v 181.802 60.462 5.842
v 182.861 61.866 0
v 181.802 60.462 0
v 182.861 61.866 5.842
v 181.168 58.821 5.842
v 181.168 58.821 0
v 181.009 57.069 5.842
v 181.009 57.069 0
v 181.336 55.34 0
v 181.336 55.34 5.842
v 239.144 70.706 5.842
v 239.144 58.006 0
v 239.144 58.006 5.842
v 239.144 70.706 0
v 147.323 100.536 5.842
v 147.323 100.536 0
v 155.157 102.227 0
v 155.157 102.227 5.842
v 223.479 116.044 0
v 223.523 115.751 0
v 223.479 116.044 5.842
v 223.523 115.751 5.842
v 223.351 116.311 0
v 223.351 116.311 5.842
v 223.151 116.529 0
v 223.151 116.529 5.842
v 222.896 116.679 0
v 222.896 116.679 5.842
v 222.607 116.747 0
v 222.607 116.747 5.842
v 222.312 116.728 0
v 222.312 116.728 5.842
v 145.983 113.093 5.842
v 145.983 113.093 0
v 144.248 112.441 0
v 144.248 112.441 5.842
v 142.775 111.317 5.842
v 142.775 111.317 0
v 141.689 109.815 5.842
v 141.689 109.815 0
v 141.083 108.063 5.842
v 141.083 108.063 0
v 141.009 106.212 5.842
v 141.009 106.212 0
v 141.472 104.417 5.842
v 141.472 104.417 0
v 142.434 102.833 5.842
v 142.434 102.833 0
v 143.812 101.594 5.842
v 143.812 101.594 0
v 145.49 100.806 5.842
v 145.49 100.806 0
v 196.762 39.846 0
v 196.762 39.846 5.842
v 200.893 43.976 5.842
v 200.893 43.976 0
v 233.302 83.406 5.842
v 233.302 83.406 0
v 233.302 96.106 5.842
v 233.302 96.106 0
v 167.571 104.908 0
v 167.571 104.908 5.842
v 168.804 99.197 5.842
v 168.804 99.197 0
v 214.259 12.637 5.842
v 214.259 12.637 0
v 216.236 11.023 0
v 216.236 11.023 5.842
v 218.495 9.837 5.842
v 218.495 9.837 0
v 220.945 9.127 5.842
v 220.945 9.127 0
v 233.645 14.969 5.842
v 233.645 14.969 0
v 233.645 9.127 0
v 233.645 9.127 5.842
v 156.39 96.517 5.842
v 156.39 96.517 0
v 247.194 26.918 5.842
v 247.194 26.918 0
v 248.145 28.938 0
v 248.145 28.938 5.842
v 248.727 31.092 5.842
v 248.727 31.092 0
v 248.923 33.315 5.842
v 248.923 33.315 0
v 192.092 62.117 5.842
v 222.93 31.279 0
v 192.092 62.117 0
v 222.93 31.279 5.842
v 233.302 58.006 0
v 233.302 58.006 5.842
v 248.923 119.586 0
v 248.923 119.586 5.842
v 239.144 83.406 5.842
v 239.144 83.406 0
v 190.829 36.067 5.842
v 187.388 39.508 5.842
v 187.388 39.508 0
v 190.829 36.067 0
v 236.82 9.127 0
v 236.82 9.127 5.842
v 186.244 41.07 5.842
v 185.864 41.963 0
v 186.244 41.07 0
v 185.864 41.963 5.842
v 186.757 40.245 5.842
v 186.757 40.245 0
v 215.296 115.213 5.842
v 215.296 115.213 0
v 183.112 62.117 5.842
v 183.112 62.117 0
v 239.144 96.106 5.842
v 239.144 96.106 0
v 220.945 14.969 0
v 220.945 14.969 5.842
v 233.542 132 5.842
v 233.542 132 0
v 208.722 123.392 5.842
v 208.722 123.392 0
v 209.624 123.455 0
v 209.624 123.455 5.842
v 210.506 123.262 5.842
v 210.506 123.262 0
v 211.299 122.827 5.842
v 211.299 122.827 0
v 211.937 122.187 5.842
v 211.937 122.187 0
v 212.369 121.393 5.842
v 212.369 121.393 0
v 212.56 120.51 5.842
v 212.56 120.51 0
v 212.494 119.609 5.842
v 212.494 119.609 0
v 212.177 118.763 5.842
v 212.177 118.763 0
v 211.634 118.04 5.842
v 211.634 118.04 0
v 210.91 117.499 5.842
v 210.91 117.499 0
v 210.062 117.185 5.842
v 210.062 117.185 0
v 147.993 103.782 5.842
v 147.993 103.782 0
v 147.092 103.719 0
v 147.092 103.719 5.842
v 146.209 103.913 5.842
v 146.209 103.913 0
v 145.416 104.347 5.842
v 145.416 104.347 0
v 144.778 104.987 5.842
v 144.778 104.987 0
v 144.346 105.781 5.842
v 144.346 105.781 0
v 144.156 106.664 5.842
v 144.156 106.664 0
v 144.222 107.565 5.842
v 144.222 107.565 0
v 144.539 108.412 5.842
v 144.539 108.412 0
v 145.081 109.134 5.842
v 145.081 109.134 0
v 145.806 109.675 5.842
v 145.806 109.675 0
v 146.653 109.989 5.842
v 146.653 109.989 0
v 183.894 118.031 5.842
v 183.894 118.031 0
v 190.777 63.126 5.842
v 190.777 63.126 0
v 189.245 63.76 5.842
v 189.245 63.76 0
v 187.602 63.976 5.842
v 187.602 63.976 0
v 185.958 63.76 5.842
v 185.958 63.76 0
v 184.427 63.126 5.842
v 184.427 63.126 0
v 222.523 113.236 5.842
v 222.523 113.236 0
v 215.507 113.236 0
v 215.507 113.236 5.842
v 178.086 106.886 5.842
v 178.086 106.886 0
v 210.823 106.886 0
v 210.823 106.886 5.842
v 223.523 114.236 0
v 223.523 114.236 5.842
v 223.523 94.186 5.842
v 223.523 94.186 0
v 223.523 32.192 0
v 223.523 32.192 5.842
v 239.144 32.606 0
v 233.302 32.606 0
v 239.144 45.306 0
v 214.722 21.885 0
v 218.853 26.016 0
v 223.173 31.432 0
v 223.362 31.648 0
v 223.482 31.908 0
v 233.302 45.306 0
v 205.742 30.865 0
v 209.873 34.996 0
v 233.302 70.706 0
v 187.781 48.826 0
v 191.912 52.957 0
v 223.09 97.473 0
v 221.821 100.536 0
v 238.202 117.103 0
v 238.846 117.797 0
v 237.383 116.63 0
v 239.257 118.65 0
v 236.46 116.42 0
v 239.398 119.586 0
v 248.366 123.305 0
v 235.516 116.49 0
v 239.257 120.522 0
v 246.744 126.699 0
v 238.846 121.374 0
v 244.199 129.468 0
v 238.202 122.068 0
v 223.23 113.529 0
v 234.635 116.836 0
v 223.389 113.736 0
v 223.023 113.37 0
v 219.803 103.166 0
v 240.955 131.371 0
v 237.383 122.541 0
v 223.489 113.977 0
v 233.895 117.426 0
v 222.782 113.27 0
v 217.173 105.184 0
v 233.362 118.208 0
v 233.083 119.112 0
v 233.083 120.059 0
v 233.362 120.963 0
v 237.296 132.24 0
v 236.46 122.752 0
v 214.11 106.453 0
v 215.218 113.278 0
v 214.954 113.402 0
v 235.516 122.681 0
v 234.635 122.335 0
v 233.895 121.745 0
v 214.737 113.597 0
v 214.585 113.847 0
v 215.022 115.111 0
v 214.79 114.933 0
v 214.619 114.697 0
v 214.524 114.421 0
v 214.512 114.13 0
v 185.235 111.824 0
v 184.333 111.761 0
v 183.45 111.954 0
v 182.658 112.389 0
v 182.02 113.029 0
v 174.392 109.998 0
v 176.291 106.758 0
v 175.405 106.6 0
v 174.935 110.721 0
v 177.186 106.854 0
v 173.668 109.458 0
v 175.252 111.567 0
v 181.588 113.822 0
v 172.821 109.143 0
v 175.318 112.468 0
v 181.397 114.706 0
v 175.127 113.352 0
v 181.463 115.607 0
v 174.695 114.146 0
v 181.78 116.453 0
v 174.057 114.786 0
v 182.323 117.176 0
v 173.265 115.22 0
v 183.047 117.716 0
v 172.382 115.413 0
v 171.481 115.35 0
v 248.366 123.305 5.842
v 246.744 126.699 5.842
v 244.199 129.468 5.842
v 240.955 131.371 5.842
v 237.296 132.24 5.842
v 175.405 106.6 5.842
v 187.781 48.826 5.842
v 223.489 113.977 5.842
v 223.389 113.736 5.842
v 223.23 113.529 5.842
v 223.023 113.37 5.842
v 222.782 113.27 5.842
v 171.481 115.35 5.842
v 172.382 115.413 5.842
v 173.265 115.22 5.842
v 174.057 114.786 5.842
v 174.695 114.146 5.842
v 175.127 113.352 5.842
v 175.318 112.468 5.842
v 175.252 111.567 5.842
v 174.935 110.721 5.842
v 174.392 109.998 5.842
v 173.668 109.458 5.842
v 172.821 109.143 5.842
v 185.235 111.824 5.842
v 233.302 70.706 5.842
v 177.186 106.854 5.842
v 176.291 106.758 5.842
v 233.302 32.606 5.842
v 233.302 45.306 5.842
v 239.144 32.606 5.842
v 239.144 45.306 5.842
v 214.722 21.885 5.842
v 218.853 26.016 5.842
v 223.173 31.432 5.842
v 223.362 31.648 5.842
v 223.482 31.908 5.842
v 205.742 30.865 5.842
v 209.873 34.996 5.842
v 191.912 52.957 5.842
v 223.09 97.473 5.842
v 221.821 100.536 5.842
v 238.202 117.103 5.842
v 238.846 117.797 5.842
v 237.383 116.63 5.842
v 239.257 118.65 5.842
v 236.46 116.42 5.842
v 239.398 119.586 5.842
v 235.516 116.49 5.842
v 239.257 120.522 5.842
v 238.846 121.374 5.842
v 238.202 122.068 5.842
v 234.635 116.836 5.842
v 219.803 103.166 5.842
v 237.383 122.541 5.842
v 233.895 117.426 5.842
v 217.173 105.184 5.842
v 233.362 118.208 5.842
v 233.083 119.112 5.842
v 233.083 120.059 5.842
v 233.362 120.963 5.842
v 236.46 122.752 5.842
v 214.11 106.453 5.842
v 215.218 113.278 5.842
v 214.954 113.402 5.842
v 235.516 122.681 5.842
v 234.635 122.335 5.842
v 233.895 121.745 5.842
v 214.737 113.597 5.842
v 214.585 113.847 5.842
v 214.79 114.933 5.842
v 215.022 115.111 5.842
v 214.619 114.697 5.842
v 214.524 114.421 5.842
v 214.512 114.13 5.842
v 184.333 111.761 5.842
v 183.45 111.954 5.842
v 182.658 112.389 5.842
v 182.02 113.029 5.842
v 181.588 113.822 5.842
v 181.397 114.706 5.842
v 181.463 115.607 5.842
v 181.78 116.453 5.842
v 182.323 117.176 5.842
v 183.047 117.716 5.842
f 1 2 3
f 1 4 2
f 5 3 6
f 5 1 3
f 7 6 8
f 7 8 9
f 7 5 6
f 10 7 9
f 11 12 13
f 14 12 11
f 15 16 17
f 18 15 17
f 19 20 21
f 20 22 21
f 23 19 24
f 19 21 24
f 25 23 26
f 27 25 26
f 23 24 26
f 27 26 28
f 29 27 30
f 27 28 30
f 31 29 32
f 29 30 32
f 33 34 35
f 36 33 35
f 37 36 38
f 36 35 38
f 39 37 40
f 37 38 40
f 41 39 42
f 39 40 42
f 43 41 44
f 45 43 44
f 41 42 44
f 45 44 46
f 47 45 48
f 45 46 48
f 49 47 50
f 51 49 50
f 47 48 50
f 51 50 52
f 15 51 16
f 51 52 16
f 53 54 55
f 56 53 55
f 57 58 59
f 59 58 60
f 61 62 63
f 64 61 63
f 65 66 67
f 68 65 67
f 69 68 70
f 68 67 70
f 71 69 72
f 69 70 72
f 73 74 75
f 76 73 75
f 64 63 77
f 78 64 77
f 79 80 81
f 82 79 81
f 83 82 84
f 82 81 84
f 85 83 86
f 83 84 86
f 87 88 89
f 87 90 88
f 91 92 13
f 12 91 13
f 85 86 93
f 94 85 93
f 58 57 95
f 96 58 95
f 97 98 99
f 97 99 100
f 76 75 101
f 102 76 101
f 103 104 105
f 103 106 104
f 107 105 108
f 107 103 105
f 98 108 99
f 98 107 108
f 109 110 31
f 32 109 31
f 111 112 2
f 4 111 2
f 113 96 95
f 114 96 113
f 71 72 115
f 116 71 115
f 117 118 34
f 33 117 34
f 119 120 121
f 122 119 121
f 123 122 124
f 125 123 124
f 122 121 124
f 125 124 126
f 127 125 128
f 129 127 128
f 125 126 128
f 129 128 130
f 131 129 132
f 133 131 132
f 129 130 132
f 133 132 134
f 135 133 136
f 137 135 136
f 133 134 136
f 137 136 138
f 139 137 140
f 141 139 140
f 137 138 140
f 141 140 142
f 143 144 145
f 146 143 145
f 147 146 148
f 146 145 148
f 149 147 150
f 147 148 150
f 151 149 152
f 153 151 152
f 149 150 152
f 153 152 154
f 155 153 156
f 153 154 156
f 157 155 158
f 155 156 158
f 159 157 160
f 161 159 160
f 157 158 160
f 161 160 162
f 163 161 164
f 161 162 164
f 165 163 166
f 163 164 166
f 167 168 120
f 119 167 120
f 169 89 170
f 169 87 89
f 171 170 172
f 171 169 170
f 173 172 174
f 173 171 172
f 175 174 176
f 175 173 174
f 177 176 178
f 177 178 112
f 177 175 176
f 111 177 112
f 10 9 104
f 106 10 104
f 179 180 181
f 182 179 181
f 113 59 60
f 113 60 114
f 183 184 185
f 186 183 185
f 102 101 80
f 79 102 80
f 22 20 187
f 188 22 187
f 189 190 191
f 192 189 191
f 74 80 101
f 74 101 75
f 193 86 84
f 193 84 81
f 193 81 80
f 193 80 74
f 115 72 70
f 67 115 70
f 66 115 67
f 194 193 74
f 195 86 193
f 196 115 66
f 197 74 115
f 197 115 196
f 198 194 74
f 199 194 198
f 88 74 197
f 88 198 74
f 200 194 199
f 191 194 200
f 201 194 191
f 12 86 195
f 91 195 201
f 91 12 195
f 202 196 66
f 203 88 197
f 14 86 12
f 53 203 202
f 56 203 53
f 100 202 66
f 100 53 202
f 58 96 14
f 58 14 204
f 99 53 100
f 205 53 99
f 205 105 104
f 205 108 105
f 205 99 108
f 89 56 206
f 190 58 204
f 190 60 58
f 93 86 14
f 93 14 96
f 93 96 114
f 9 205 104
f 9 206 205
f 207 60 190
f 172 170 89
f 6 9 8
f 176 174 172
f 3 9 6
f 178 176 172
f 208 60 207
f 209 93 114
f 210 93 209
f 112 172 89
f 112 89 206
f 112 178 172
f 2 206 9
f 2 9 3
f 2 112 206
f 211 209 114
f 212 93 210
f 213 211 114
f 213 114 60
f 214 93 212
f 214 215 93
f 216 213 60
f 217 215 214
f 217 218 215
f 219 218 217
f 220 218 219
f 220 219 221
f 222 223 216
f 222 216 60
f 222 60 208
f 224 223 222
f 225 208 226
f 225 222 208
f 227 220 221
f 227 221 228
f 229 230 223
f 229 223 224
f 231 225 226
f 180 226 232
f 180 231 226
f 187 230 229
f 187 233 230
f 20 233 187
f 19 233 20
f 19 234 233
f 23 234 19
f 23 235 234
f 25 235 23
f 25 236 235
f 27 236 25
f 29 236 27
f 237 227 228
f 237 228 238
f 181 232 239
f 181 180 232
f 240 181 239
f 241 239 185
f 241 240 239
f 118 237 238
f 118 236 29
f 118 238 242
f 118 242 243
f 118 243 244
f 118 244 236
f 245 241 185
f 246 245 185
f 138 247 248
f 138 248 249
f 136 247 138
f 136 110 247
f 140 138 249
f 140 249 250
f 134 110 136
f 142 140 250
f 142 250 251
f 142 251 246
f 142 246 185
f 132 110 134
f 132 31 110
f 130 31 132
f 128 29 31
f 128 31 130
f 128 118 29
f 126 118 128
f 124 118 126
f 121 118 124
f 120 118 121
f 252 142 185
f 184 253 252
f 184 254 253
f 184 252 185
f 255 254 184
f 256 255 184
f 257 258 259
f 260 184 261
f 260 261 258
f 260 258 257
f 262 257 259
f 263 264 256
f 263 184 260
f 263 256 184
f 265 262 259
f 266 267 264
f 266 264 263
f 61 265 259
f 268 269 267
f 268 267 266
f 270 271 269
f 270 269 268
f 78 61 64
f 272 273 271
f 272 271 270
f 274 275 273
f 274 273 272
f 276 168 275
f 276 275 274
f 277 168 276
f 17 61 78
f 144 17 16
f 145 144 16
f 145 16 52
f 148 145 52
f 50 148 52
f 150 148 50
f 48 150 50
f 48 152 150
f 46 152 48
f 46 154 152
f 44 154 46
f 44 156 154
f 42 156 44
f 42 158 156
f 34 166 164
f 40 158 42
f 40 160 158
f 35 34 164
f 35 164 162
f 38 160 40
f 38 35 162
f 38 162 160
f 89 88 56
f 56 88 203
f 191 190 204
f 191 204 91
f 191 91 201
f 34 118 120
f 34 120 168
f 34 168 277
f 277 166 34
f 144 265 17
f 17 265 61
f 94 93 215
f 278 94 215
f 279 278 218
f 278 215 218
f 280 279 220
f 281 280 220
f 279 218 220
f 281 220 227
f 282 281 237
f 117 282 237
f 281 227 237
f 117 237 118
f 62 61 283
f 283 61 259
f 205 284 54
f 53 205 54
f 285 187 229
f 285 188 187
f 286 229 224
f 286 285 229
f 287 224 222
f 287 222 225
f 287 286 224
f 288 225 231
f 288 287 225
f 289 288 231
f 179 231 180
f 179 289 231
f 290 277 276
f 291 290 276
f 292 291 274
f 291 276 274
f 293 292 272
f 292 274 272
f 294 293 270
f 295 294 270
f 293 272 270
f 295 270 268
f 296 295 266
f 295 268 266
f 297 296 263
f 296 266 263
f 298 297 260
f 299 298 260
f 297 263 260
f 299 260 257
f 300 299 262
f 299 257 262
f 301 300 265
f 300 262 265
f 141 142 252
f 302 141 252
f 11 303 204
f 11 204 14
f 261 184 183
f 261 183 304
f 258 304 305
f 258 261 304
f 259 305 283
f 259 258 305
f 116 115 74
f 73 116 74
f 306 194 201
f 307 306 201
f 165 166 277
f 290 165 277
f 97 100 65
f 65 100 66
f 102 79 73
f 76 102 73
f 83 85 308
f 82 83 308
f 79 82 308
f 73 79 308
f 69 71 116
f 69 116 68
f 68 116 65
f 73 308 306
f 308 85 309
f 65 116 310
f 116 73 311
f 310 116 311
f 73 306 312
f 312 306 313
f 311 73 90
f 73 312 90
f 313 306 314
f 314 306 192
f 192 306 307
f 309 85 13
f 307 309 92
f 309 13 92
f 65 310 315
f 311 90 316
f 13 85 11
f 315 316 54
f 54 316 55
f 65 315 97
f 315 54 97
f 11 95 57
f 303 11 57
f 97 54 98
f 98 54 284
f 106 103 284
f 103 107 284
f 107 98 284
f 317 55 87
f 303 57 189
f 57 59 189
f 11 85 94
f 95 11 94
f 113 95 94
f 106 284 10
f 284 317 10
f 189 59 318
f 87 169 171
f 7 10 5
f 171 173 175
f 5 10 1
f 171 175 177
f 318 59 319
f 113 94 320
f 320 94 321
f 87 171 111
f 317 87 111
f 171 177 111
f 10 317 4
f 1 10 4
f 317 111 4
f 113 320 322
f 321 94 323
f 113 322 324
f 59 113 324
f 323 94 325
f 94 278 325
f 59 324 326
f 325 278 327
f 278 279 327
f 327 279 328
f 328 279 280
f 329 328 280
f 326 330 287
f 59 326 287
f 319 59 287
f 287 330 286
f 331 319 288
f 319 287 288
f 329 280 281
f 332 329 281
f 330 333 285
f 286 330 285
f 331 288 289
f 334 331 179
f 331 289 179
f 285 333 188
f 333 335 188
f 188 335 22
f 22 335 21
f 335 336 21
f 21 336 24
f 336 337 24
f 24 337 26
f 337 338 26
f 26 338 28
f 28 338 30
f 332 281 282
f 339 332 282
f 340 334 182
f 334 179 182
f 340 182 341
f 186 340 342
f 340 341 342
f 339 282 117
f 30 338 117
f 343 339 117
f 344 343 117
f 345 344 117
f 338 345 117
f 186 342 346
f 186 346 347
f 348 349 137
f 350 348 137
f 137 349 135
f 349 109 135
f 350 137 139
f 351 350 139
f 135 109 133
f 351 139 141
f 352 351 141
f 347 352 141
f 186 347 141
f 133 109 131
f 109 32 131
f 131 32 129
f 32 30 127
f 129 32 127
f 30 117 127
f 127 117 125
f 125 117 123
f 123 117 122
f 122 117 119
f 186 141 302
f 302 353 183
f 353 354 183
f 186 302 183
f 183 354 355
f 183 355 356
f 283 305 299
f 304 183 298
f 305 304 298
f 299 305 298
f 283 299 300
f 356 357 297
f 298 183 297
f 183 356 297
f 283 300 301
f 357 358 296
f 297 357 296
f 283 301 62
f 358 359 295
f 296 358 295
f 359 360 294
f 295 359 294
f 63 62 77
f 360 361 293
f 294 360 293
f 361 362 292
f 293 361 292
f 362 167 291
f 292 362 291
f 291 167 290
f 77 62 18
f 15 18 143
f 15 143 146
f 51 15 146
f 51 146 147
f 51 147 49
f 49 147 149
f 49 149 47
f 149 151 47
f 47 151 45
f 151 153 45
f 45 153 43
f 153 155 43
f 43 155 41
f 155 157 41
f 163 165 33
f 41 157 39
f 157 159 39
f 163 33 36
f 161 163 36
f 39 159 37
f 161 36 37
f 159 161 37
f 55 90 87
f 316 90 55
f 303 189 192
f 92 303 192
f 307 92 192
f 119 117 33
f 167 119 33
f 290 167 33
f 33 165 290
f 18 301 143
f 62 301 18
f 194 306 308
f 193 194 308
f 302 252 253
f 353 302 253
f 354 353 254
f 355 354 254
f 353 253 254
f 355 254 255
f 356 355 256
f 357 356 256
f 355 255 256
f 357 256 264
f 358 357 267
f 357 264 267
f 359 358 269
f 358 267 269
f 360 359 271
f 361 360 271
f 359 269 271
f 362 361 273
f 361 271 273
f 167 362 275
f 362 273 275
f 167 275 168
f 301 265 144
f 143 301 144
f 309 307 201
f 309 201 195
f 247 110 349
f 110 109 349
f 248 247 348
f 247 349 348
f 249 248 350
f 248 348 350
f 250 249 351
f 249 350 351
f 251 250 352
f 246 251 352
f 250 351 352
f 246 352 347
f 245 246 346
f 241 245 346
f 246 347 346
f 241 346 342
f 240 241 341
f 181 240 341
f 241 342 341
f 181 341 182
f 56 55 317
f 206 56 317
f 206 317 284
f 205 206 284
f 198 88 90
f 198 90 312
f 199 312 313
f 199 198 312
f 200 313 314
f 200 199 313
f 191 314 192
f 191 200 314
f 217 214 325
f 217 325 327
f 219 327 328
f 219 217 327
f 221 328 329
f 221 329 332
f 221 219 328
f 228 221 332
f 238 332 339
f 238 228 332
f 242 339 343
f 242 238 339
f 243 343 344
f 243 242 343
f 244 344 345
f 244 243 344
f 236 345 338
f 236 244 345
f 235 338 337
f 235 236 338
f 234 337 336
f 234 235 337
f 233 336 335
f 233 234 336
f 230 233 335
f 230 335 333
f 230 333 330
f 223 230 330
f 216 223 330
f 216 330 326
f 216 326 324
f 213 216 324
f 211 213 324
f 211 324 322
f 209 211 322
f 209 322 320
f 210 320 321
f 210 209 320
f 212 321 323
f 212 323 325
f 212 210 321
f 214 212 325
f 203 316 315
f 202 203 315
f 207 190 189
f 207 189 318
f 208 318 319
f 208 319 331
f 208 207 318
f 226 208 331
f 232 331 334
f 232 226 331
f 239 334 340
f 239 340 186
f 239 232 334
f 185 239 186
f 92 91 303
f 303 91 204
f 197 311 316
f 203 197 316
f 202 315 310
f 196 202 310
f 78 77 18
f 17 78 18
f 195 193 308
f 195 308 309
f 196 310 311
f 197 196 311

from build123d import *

# Parameters (mm, degrees)
SKETCH1_R           = 3.175
SKETCH1_W           = 5.842
SKETCH1_H           = 12.7
BOSS_EXTRUDE1_DEPTH = 5.842
FILLET3_R           = 12.7
FILLET4_R           = 1
FILLET5_R           = 1
BOSS_EXTRUDE2_DEPTH = 5.842
CUT_EXTRUDE1_DEPTH  = 282.950775489
FILLET6_R           = 6.35
BOSS_EXTRUDE3_DEPTH = 5.842


with BuildPart() as part:
    # Sketch1 → Boss-Extrude1 (new body)
    with BuildSketch(Plane.XY):
        with BuildLine():
            Line((217.770203729, 9.126532246), (220.945203729, 9.126532246))
            Line((220.945203729, 9.126532246), (220.945203729, 14.968532246))
            Line((220.945203729, 14.968532246), (233.645203729, 14.968532246))
            Line((233.645203729, 14.968532246), (233.645203729, 9.126532246))
            Line((233.645203729, 9.126532246), (236.820203729, 9.126532246))
            Line((236.820203729, 9.126532246), (248.922907622, 29.883396652))
            Line((248.922907622, 29.883396652), (248.922907622, 36.233396652))
            Line((248.922907622, 36.233396652), (248.922907622, 99.733396652))
            Line((248.922907622, 99.733396652), (248.922907622, 119.585663985))
            ThreePointArc((248.922907622, 119.585663985), (244.199339956, 129.46830165), (233.542352153, 131.99955227))
            Line((233.542352153, 131.99955227), (145.982629888, 113.092608128))
            ThreePointArc((145.982629888, 113.092608128), (141.008772871, 106.211718626), (147.322907622, 100.535663985))
            Line((147.322907622, 100.535663985), (176.730316466, 106.885663985))
            Line((176.730316466, 106.885663985), (223.522907622, 106.885663985))
            Line((223.522907622, 106.885663985), (223.522907622, 30.685663985))
            Line((223.522907622, 30.685663985), (222.929875834, 31.278695773))
            Line((222.929875834, 31.278695773), (218.798958018, 27.147777957))
            Line((218.798958018, 27.147777957), (209.818701897, 36.128034078))
            Line((209.818701897, 36.128034078), (213.949619713, 40.258951894))
            Line((213.949619713, 40.258951894), (204.969363592, 49.239208015))
            Line((204.969363592, 49.239208015), (200.838445776, 45.108290199))
            Line((200.838445776, 45.108290199), (187.961093383, 57.985642593))
            Line((187.961093383, 57.985642593), (192.092011199, 62.116560408))
            Line((192.092011199, 62.116560408), (187.601883138, 66.606688469))
            Line((187.601883138, 66.606688469), (180.072011297, 59.076816628))
            Line((180.072011297, 59.076816628), (186.339307306, 40.55742867))
            Line((186.339307306, 40.55742867), (190.829435366, 36.067300609))
            Line((190.829435366, 36.067300609), (217.770203729, 9.126532246))
        make_face()
        with Locations((236.222907622, 119.585663985)):
            Circle(SKETCH1_R, mode=Mode.SUBTRACT)
        Polygon((223.522907622, 116.989680814), (223.522907622, 113.235663985), (206.137725309, 113.235663985), align=None, mode=Mode.SUBTRACT)
        with BuildLine():
            Line((146.652768755, 109.989136056), (171.480545327, 115.350246995))
            ThreePointArc((171.480545327, 115.350246995), (175.254156266, 112.916913791), (172.820823062, 109.143302852))
            Line((172.820823062, 109.143302852), (147.99304649, 103.782191913))
            ThreePointArc((147.99304649, 103.782191913), (144.219435551, 106.215525117), (146.652768755, 109.989136056))
        make_face(mode=Mode.SUBTRACT)
        with BuildLine():
            Line((183.894433613, 118.030802464), (208.722210185, 123.391913403))
            ThreePointArc((208.722210185, 123.391913403), (212.495821124, 120.958580199), (210.062487919, 117.18496926))
            Line((210.062487919, 117.18496926), (185.234711348, 111.823858321))
            ThreePointArc((185.234711348, 111.823858321), (181.461100409, 114.257191525), (183.894433613, 118.030802464))
        make_face(mode=Mode.SUBTRACT)
        with Locations((236.222907622, 38.956098115)):
            Rectangle(SKETCH1_W, SKETCH1_H, mode=Mode.SUBTRACT)
        with Locations((236.222907622, 64.356098115)):
            Rectangle(SKETCH1_W, SKETCH1_H, mode=Mode.SUBTRACT)
        with Locations((236.222907622, 89.756098115)):
            Rectangle(SKETCH1_W, SKETCH1_H, mode=Mode.SUBTRACT)
    extrude(amount=BOSS_EXTRUDE1_DEPTH)

    # Fillet3
    # the kernel refuses this fillet: 12.7 mm, written as the material it adds along each edge
    with BuildSketch(Plane(origin=(223.522907622, 106.885663985, 0), x_dir=(0, -1, 0), z_dir=(0, 0, 1))) as fillet3_piece_1:
        with BuildLine():
            CenterArc((FILLET3_R, -FILLET3_R), FILLET3_R, 90, 90)
            Line((0, -FILLET3_R), (0, 0))
            Line((0, 0), (FILLET3_R, 0))
        make_face()
    extrude(amount=5.842)
    with BuildSketch(Plane(origin=(176.730316466, 106.885663985, 0), x_dir=(1, 0, 0), z_dir=(0, 0, 1))) as fillet3_piece_2:
        with BuildLine():
            CenterArc((FILLET3_R * 0.106735979666, -FILLET3_R), FILLET3_R, 90, 12.184909582)
            Line((-FILLET3_R * 0.104331380131, -FILLET3_R * 0.0225284814234), (0, 0))
            Line((0, 0), (FILLET3_R * 0.106735979666, 0))
        make_face()
    extrude(amount=5.842)
    # the kernel refuses this fillet: 12.7 mm, written as the material it takes off along each edge
    with BuildSketch(Plane(origin=(248.922907622, 29.883396652, -8.580237273), x_dir=(-0.50370125175659, -0.8638779132370756, 0), z_dir=(0, 0, 1))) as fillet3_2_piece_1:
        with BuildLine():
            CenterArc((FILLET3_R * 0.270243693634, -FILLET3_R), FILLET3_R, 90, 30.245176455)
            Line((-FILLET3_R * 0.233457558122, -FILLET3_R * 0.136122086763), (0, 0))
            Line((0, 0), (FILLET3_R * 0.270243693634, 0))
        make_face()
    extrude(amount=23.002474546, mode=Mode.SUBTRACT)
    with BuildSketch(Plane(origin=(217.770203729, 9.126532246, -12.412377003), x_dir=(1, 0, 0), z_dir=(0, 0, 1))) as fillet3_2_piece_2:
        with BuildLine():
            CenterArc((5.469505741, 12.491006501), FILLET3_R, 225, 34.591227114)
            Line((-3.51075038, 3.51075038), (0, 0))
            Line((0, 0), (3.175, 0))
        make_face()
    extrude(amount=30.666754006, mode=Mode.SUBTRACT)

    # Fillet4
    fillet4_edges = [part.edges().sort_by_distance(p)[0] for p in [
        (223.522907622, 116.989680814, 2.921),
        (206.137725309, 113.235663985, 2.921),
        (223.522907622, 113.235663985, 2.921),
    ]]
    fillet(fillet4_edges, radius=FILLET4_R)

    # Fillet5
    # the kernel refuses this fillet: 1 mm, written as the material it adds along each edge
    with BuildSketch(Plane(origin=(223.522907622, 30.685663985, 0), x_dir=(0, 1, 0), z_dir=(0, 0, 1))) as fillet5_piece_1:
        with BuildLine():
            CenterArc((1.50647411, 1), FILLET5_R, 204.01452435, 65.98547565)
            Line((0.593031788, 0.593031788), (0.574762942, 0.584892424))
            ThreePointArc((0.574762942, 0.584892424), (0.282373759, 0.31065803), (-0.014142136, 0.014142136))
            Line((-0.014142136, 0.014142136), (0, -0.02))
            Line((0, -0.02), (1.50647411, -0.02))
            Line((1.50647411, -0.02), (1.50647411, 0))
        make_face()
    extrude(amount=5.842)

    # Sketch4 → Boss-Extrude2 (add)
    with BuildSketch(Plane.XY.offset(5.842)):
        Polygon((192.092011199, 62.116560408), (222.590849502, 31.617722105), (222.929875834, 31.278695773), (218.798958018, 27.147777957), (187.961093383, 57.985642593), align=None)
    extrude(amount=-BOSS_EXTRUDE2_DEPTH)

    # Sketch5 → Cut-Extrude1 (cut, through all)
    with BuildSketch(Plane.XY.offset(5.842)):
        Polygon((191.912406076, 52.956699165), (187.781488261, 48.825781349), (196.761744382, 39.845525228), (200.892662197, 43.976443044), align=None)
        Polygon((209.872918318, 34.996186923), (205.742000503, 30.865269107), (214.722256624, 21.885012986), (218.85317444, 26.015930802), align=None)
    extrude(amount=-CUT_EXTRUDE1_DEPTH, mode=Mode.SUBTRACT)

    # Fillet6
    fillet6_edges = [part.edges().sort_by_distance(p)[0] for p in [
        (186.339307306, 40.55742867, 2.921),
        (180.072011297, 59.076816628, 2.921),
        (187.601883138, 66.606688469, 2.921),
    ]]
    fillet(fillet6_edges, radius=FILLET6_R)

    # Sketch6 → Boss-Extrude3 (add)
    with BuildSketch(Plane.XY.offset(5.842)):
        Polygon((168.804107439, 99.197497251), (156.390219153, 96.516941781), (155.157163637, 102.227330393), (167.571051923, 104.907885862), align=None)
    extrude(amount=-BOSS_EXTRUDE3_DEPTH)


solid = part.part
